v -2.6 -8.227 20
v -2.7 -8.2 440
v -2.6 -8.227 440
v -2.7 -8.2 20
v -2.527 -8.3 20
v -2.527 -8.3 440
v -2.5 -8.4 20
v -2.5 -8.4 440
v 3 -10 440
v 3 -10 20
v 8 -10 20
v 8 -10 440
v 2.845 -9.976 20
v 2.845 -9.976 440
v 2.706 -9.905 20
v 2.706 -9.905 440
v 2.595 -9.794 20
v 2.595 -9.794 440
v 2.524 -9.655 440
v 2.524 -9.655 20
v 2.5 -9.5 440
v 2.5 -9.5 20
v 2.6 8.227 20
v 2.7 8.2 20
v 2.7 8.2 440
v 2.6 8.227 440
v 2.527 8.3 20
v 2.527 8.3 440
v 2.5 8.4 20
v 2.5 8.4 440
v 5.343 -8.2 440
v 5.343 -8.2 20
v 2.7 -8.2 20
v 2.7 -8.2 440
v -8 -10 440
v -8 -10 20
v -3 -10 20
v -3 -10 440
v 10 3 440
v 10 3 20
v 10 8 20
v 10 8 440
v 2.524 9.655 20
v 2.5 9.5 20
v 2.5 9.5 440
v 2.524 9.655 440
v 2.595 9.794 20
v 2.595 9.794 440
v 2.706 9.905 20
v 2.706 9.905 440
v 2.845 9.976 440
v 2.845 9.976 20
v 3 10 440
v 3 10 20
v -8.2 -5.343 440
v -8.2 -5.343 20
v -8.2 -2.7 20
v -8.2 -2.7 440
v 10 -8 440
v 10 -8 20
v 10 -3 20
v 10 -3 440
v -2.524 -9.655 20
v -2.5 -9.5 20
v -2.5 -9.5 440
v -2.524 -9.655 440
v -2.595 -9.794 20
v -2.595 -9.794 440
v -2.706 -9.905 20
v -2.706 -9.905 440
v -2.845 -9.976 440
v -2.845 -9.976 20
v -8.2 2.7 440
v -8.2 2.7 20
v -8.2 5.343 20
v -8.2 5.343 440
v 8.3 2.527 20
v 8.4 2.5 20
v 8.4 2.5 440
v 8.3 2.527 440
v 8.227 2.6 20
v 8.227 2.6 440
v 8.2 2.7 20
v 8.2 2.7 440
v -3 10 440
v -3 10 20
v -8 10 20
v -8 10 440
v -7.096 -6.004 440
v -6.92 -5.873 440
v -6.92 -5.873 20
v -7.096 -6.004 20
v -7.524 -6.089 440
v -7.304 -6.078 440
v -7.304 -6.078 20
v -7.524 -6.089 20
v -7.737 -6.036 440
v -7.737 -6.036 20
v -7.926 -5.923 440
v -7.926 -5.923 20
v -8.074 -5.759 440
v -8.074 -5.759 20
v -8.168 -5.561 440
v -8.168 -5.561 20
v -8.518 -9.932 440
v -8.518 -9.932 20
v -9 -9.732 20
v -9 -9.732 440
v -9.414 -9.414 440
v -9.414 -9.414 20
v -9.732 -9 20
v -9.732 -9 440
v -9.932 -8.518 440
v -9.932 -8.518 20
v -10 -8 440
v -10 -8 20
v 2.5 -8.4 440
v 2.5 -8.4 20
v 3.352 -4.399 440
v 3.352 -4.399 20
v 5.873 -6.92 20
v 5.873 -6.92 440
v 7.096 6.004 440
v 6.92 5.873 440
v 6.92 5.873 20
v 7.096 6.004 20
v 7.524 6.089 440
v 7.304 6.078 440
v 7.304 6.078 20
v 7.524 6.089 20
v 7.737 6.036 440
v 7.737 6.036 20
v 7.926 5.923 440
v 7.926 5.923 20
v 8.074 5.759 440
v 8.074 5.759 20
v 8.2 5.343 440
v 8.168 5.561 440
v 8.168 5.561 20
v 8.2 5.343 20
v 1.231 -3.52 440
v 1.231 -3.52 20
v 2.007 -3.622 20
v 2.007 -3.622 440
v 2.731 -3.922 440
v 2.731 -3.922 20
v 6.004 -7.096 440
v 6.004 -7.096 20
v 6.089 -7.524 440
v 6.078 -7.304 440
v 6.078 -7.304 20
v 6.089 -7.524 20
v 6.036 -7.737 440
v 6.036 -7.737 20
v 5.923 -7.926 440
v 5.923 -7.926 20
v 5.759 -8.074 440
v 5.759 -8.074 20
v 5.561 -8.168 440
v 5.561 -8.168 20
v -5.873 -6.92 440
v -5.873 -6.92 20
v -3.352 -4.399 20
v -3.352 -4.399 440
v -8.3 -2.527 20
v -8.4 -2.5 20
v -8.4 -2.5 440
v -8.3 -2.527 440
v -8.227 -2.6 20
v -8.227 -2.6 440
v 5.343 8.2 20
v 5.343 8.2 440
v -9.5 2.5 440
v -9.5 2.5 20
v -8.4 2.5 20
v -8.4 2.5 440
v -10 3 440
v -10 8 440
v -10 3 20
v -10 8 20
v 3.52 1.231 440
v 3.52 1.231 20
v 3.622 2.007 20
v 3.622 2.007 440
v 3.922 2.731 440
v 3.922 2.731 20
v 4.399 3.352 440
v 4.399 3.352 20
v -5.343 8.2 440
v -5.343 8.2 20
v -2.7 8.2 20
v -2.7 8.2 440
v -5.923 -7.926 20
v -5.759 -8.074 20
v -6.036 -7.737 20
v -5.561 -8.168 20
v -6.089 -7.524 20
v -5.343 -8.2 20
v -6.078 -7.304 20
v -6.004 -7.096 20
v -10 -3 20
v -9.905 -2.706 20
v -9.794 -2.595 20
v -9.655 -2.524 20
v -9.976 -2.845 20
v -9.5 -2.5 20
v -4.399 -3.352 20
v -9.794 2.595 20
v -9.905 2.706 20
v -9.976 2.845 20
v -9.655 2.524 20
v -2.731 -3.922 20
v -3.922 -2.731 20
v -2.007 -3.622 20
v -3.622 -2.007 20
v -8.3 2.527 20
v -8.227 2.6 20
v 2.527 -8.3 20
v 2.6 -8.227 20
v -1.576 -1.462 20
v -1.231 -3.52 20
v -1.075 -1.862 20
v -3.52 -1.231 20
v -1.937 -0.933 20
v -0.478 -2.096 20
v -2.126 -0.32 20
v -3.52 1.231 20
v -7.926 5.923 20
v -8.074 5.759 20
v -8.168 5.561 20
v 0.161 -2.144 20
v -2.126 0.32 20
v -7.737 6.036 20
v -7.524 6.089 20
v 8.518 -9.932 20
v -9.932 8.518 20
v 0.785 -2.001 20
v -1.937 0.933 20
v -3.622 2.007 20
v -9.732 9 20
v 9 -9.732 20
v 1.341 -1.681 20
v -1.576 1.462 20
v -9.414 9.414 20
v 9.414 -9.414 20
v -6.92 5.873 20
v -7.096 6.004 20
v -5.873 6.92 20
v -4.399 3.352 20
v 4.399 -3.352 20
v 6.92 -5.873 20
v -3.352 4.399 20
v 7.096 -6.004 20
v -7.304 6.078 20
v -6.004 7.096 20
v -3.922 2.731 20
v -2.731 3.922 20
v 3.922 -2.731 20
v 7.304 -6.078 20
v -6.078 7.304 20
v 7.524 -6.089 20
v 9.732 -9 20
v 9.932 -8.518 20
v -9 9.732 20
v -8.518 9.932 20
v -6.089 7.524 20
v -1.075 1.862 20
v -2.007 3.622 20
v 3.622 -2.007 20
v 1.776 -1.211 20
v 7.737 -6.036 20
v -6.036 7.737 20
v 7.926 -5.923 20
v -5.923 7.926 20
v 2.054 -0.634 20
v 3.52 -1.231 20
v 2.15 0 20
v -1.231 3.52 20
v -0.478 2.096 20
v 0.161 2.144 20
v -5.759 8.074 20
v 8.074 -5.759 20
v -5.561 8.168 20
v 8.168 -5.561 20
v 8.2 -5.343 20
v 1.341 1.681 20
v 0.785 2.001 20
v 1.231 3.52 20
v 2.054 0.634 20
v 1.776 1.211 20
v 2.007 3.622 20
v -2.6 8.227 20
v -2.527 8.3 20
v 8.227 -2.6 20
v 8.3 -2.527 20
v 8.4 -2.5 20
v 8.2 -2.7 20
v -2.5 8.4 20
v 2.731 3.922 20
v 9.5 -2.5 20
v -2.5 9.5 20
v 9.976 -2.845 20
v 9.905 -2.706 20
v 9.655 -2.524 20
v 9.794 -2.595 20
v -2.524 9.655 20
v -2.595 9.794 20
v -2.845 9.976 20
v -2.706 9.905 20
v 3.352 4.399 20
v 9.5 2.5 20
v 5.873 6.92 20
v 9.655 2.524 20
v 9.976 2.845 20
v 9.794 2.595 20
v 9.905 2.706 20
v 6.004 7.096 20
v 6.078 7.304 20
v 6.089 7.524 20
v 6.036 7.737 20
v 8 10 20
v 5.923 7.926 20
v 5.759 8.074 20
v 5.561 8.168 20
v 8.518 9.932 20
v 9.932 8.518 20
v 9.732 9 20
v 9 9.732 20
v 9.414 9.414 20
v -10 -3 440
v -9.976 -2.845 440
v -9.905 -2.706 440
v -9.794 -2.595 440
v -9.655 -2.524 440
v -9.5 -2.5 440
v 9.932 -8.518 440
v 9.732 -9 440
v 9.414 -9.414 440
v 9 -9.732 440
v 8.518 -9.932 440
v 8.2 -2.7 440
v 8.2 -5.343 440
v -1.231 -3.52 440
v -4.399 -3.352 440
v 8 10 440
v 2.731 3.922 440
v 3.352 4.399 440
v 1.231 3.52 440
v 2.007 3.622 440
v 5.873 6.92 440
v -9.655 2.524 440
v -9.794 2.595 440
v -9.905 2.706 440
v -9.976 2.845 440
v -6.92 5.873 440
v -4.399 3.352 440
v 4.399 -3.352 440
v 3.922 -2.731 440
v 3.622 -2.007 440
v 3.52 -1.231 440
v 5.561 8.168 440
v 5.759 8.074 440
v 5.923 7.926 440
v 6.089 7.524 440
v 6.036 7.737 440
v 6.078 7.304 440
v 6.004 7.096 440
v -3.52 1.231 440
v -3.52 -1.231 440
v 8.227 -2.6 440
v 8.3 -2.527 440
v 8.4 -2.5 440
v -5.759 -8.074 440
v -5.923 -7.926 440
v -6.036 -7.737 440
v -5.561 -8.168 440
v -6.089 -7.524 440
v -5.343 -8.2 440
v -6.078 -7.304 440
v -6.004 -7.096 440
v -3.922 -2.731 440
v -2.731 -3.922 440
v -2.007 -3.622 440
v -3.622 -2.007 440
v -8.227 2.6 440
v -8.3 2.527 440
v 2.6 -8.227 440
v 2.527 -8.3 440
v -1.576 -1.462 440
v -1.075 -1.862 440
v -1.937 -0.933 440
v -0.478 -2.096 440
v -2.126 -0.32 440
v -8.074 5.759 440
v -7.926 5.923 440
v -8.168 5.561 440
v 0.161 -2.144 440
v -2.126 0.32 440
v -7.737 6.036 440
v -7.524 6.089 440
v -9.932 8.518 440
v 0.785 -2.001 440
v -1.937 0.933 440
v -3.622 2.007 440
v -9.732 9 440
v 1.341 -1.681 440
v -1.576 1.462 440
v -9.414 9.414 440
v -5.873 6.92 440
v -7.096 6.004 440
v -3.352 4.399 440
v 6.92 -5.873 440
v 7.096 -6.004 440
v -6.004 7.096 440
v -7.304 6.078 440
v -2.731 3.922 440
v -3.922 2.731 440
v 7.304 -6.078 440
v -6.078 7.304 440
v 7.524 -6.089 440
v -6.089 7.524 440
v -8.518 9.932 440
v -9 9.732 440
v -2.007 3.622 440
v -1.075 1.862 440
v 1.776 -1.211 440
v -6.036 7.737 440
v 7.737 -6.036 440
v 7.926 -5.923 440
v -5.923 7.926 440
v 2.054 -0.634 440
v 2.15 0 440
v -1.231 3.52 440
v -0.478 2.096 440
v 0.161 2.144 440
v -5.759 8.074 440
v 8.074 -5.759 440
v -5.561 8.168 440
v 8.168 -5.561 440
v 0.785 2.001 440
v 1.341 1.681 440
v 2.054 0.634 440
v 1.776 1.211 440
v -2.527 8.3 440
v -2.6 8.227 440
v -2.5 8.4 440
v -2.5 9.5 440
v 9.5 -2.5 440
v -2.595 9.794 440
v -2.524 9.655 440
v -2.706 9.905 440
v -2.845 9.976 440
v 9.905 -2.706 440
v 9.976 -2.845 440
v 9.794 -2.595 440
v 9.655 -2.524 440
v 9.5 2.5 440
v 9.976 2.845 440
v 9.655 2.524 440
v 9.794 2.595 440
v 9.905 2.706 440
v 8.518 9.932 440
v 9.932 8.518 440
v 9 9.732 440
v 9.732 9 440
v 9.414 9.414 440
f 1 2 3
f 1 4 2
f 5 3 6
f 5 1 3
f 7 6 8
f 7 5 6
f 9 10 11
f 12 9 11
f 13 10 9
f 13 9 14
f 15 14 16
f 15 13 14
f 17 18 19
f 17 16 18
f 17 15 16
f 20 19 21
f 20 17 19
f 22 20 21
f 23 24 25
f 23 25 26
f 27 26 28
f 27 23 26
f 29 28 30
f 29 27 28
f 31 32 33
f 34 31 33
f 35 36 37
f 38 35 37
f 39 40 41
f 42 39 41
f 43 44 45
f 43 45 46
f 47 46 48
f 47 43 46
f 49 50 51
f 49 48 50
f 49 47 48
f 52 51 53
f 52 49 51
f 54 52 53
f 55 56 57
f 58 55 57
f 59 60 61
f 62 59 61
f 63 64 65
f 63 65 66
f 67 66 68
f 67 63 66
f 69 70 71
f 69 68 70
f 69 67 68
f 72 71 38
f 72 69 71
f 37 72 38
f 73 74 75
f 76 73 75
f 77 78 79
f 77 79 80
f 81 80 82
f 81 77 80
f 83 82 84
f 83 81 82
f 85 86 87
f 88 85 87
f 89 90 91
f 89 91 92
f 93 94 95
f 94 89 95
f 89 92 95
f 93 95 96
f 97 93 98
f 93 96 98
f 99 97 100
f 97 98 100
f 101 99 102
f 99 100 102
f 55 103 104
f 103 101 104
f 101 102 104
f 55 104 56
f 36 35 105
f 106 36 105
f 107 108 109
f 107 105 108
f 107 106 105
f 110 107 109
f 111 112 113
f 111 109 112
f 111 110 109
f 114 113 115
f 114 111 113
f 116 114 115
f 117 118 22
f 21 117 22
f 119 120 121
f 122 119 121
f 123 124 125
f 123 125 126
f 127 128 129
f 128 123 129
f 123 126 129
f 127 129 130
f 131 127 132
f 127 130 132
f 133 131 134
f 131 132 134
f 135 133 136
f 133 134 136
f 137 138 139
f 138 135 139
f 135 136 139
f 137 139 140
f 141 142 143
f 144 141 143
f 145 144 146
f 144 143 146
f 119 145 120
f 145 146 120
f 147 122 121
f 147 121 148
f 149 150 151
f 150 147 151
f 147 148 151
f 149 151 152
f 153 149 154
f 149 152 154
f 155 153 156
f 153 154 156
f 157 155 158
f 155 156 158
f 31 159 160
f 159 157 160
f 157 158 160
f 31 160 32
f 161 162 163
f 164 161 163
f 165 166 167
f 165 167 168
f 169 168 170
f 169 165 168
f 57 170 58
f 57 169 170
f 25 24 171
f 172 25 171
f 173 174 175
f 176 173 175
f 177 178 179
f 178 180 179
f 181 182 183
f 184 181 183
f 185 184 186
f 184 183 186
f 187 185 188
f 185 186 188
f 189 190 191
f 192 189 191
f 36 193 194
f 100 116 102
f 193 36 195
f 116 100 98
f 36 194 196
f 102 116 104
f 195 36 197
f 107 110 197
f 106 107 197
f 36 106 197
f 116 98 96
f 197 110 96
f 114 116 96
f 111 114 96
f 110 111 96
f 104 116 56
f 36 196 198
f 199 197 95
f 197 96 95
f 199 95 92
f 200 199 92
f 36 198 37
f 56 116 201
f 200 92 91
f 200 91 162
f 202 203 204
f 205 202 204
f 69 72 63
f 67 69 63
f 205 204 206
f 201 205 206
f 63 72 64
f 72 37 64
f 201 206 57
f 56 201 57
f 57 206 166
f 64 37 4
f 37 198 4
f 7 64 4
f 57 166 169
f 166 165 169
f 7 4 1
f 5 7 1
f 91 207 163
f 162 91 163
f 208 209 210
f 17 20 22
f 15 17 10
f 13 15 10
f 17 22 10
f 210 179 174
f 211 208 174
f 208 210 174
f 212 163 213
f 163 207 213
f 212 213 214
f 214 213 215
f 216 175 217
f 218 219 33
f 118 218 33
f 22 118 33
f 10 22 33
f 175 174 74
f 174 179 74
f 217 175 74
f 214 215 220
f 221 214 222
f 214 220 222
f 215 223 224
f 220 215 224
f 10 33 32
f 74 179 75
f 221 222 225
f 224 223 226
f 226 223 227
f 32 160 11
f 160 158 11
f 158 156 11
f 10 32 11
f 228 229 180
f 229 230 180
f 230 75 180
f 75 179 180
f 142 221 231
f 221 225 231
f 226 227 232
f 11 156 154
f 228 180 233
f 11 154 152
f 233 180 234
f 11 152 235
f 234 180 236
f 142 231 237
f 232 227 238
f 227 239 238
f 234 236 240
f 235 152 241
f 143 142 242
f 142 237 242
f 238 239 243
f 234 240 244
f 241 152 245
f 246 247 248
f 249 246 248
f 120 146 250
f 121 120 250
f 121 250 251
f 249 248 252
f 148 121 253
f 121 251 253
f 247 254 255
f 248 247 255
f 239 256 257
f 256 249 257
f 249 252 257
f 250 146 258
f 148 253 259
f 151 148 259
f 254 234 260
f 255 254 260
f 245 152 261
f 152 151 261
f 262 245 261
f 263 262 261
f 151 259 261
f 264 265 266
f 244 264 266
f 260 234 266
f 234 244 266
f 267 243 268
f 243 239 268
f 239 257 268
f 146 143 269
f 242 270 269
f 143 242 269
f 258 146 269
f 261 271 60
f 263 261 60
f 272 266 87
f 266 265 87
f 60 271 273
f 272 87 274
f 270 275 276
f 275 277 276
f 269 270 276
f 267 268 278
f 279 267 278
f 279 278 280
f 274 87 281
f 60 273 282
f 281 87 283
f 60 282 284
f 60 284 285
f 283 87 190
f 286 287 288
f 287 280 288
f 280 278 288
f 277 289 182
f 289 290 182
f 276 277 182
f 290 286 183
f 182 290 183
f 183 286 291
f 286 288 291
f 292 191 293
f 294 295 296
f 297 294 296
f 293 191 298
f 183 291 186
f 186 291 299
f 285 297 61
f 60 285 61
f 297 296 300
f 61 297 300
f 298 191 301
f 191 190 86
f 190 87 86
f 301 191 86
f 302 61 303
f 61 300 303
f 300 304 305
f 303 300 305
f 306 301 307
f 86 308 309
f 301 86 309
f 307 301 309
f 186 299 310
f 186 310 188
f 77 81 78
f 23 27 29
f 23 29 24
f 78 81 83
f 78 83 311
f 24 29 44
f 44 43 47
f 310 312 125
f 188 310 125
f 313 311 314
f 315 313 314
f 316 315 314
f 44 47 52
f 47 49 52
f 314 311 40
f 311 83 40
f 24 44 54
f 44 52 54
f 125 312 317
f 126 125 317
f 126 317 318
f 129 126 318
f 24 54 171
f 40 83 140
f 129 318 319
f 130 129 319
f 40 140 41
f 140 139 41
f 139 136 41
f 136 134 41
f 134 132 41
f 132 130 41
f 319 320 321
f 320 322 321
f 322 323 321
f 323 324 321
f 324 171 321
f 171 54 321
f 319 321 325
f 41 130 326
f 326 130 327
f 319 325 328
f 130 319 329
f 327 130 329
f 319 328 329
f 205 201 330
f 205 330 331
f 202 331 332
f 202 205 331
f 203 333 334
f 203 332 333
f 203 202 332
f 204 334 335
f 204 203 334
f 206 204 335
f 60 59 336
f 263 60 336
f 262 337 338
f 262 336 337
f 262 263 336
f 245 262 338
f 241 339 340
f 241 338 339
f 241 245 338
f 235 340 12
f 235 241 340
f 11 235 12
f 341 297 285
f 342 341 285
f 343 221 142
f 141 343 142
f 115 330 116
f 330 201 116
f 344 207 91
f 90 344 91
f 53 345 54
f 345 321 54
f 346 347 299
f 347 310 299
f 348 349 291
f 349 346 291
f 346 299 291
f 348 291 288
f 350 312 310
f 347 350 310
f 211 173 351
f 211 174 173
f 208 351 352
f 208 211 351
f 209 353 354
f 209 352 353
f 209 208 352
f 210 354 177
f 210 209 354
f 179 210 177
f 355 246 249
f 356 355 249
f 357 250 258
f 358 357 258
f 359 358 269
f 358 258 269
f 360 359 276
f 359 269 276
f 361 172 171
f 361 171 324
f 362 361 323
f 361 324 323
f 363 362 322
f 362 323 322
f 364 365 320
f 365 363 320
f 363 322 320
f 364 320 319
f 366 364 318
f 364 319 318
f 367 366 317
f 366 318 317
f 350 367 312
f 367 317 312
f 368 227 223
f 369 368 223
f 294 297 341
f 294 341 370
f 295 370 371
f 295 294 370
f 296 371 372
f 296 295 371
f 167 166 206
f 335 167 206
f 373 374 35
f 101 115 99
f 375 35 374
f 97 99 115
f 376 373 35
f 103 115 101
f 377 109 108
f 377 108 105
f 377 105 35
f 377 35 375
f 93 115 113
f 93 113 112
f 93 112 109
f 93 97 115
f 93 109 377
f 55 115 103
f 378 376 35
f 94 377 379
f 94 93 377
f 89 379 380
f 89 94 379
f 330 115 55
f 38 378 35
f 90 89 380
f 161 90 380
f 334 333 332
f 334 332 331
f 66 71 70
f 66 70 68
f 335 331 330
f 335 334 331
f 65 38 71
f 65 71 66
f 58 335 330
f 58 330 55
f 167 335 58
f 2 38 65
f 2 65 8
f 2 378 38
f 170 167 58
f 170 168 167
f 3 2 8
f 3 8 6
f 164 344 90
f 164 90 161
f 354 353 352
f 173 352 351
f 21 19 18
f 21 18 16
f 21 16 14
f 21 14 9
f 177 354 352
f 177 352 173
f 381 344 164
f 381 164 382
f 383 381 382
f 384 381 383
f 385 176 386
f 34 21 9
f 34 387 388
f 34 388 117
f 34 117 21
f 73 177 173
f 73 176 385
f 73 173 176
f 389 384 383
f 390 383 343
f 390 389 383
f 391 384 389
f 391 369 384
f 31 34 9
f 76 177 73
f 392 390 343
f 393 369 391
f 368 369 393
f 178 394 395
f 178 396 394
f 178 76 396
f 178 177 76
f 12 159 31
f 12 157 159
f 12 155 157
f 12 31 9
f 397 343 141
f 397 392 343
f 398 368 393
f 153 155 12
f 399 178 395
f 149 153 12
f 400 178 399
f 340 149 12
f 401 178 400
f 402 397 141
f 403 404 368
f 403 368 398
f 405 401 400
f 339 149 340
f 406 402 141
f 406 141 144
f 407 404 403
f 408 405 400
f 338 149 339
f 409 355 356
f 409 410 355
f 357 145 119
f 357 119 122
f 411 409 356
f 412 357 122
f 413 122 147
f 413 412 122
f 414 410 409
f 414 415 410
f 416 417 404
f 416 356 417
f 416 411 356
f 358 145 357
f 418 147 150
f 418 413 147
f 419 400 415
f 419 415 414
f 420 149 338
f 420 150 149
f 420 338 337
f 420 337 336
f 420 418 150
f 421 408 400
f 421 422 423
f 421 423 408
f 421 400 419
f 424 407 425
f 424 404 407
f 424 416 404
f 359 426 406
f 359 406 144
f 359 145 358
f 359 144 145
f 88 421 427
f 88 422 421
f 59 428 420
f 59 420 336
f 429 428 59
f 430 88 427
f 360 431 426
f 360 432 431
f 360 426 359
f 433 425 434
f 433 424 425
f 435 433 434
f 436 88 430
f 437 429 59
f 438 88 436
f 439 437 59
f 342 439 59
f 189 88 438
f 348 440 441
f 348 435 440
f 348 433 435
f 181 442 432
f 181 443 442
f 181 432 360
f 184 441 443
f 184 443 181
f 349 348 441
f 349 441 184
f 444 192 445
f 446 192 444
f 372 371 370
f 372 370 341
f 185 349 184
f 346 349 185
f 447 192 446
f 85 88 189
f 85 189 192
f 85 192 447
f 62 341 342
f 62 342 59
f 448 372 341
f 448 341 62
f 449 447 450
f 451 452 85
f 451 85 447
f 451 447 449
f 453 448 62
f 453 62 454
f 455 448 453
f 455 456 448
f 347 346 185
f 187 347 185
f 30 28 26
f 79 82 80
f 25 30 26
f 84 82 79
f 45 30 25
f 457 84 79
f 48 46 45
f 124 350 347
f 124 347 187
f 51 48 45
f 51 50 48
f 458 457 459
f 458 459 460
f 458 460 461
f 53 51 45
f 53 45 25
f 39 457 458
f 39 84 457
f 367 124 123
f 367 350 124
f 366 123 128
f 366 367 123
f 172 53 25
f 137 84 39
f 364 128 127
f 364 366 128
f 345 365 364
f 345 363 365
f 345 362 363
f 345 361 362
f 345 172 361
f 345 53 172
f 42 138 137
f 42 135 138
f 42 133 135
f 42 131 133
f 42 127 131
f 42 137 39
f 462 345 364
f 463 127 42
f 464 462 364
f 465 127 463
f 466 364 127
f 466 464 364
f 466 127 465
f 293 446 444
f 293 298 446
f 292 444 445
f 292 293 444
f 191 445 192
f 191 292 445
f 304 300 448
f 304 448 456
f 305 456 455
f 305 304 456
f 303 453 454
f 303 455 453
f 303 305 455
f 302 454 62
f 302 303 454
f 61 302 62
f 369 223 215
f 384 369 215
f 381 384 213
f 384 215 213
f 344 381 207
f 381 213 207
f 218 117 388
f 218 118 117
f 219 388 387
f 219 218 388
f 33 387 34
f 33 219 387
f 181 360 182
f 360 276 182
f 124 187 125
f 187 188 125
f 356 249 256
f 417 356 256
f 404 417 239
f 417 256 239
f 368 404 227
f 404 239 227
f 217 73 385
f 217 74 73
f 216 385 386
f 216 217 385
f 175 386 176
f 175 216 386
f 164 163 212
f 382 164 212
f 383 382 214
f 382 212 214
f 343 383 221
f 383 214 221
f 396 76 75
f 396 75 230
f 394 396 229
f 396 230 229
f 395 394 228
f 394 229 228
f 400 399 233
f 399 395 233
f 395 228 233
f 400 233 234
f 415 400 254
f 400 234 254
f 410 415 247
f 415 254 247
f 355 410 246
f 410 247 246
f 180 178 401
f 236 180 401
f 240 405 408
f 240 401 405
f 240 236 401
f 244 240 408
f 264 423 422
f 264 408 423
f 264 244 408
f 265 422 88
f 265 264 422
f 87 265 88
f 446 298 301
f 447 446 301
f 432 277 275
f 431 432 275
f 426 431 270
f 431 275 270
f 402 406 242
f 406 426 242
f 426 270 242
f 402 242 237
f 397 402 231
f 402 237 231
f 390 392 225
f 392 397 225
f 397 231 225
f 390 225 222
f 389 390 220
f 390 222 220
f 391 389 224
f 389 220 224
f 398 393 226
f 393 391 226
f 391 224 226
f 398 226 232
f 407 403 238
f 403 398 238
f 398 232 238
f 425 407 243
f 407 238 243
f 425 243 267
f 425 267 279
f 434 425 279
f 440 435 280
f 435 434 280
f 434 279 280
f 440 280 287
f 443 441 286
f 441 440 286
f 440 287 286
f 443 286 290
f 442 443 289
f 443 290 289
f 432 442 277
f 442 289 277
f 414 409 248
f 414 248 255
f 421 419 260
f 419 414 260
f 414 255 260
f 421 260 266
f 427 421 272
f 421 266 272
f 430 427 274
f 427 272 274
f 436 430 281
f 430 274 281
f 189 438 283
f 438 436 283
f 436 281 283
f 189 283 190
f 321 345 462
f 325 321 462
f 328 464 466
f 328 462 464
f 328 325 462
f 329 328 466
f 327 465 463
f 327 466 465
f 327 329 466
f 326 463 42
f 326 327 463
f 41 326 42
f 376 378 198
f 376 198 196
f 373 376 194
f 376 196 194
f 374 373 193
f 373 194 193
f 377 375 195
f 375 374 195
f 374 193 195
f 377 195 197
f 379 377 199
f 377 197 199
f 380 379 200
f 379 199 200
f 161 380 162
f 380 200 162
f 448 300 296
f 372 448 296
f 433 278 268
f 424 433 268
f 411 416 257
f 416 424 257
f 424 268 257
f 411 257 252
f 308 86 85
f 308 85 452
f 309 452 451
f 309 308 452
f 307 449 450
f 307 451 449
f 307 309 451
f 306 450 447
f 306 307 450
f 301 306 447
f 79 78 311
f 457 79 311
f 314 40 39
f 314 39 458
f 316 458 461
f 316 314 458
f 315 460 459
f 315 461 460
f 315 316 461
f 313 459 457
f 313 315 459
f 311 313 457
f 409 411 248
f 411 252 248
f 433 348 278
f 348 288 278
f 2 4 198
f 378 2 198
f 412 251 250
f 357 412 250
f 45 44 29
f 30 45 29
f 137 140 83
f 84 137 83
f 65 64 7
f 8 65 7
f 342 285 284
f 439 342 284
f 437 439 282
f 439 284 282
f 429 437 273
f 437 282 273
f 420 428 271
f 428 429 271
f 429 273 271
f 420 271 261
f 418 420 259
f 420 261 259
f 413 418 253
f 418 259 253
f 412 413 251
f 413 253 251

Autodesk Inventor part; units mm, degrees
ref_plane "Płaszczyzna początkowa" through (0, 0, 20) normal (0, 0, 1) x (1, 0, 0)
ref_plane "Płaszczyzna końcowa" through (0, 0, 440) normal (0, 0, 1) x (1, 0, 0)
sketch "Szkic" plane through (0, 0, 0) normal (0, 0, 1) x (1, 0, 0)
  arc A0 (8, -10) -> (10, -8) centre (8, -8) ccw
  line L0 (10, -8) -> (10, -3)
  arc A1 (10, -3) -> (9.5, -2.5) centre (9.5, -3) ccw
  line L1 (9.5, -2.5) -> (8.4, -2.5)
  arc A2 (8.4, -2.5) -> (8.2, -2.7) centre (8.4, -2.7) ccw
  line L2 (8.2, -2.7) -> (8.2, -5.3428)
  arc A3 (6.9197, -5.8732) -> (8.2, -5.3428) centre (7.45, -5.3428) ccw
  line L3 (6.9197, -5.8732) -> (4.3987, -3.3522)
  arc A4 (3.52, -1.2308) -> (4.3987, -3.3522) centre (6.52, -1.2308) ccw
  line L4 (3.52, -1.2308) -> (3.52, 1.2308)
  arc A5 (4.3987, 3.3522) -> (3.52, 1.2308) centre (6.52, 1.2308) ccw
  line L5 (4.3987, 3.3522) -> (6.9197, 5.8732)
  arc A6 (8.2, 5.3428) -> (6.9197, 5.8732) centre (7.45, 5.3428) ccw
  line L6 (8.2, 5.3428) -> (8.2, 2.7)
  arc A7 (8.2, 2.7) -> (8.4, 2.5) centre (8.4, 2.7) ccw
  line L7 (8.4, 2.5) -> (9.5, 2.5)
  arc A8 (9.5, 2.5) -> (10, 3) centre (9.5, 3) ccw
  line L8 (10, 3) -> (10, 8)
  arc A9 (10, 8) -> (8, 10) centre (8, 8) ccw
  line L9 (8, 10) -> (3, 10)
  arc A10 (3, 10) -> (2.5, 9.5) centre (3, 9.5) ccw
  line L10 (2.5, 9.5) -> (2.5, 8.4)
  arc A11 (2.5, 8.4) -> (2.7, 8.2) centre (2.7, 8.4) ccw
  line L11 (2.7, 8.2) -> (5.3428, 8.2)
  arc A12 (5.8732, 6.9197) -> (5.3428, 8.2) centre (5.3428, 7.45) ccw
  line L12 (5.8732, 6.9197) -> (3.3522, 4.3987)
  arc A13 (1.2308, 3.52) -> (3.3522, 4.3987) centre (1.2308, 6.52) ccw
  line L13 (1.2308, 3.52) -> (-1.2308, 3.52)
  arc A14 (-3.3522, 4.3987) -> (-1.2308, 3.52) centre (-1.2308, 6.52) ccw
  line L14 (-3.3522, 4.3987) -> (-5.8732, 6.9197)
  arc A15 (-5.3428, 8.2) -> (-5.8732, 6.9197) centre (-5.3428, 7.45) ccw
  line L15 (-5.3428, 8.2) -> (-2.7, 8.2)
  arc A16 (-2.7, 8.2) -> (-2.5, 8.4) centre (-2.7, 8.4) ccw
  line L16 (-2.5, 8.4) -> (-2.5, 9.5)
  arc A17 (-2.5, 9.5) -> (-3, 10) centre (-3, 9.5) ccw
  line L17 (-3, 10) -> (-8, 10)
  arc A18 (-8, 10) -> (-10, 8) centre (-8, 8) ccw
  line L18 (-10, 8) -> (-10, 3)
  arc A19 (-10, 3) -> (-9.5, 2.5) centre (-9.5, 3) ccw
  line L19 (-9.5, 2.5) -> (-8.4, 2.5)
  arc A20 (-8.4, 2.5) -> (-8.2, 2.7) centre (-8.4, 2.7) ccw
  line L20 (-8.2, 2.7) -> (-8.2, 5.3428)
  arc A21 (-6.9197, 5.8732) -> (-8.2, 5.3428) centre (-7.45, 5.3428) ccw
  line L21 (-6.9197, 5.8732) -> (-4.3987, 3.3522)
  arc A22 (-3.52, 1.2308) -> (-4.3987, 3.3522) centre (-6.52, 1.2308) ccw
  line L22 (-3.52, 1.2308) -> (-3.52, -1.2308)
  arc A23 (-4.3987, -3.3522) -> (-3.52, -1.2308) centre (-6.52, -1.2308) ccw
  line L23 (-4.3987, -3.3522) -> (-6.9197, -5.8732)
  arc A24 (-8.2, -5.3428) -> (-6.9197, -5.8732) centre (-7.45, -5.3428) ccw
  line L24 (-8.2, -5.3428) -> (-8.2, -2.7)
  arc A25 (-8.2, -2.7) -> (-8.4, -2.5) centre (-8.4, -2.7) ccw
  line L25 (-8.4, -2.5) -> (-9.5, -2.5)
  arc A26 (-9.5, -2.5) -> (-10, -3) centre (-9.5, -3) ccw
  line L26 (-10, -3) -> (-10, -8)
  arc A27 (-10, -8) -> (-8, -10) centre (-8, -8) ccw
  line L27 (-8, -10) -> (-3, -10)
  arc A28 (-3, -10) -> (-2.5, -9.5) centre (-3, -9.5) ccw
  line L28 (-2.5, -9.5) -> (-2.5, -8.4)
  arc A29 (-2.5, -8.4) -> (-2.7, -8.2) centre (-2.7, -8.4) ccw
  line L29 (-2.7, -8.2) -> (-5.3428, -8.2)
  arc A30 (-5.8732, -6.9197) -> (-5.3428, -8.2) centre (-5.3428, -7.45) ccw
  line L30 (-5.8732, -6.9197) -> (-3.3522, -4.3987)
  arc A31 (-1.2308, -3.52) -> (-3.3522, -4.3987) centre (-1.2308, -6.52) ccw
  line L31 (-1.2308, -3.52) -> (1.2308, -3.52)
  arc A32 (3.3522, -4.3987) -> (1.2308, -3.52) centre (1.2308, -6.52) ccw
  line L32 (3.3522, -4.3987) -> (5.8732, -6.9197)
  arc A33 (5.3428, -8.2) -> (5.8732, -6.9197) centre (5.3428, -7.45) ccw
  line L33 (5.3428, -8.2) -> (2.7, -8.2)
  arc A34 (2.7, -8.2) -> (2.5, -8.4) centre (2.7, -8.4) ccw
  line L34 (2.5, -8.4) -> (2.5, -9.5)
  arc A35 (2.5, -9.5) -> (3, -10) centre (3, -9.5) ccw
  line L35 (3, -10) -> (8, -10)
  circle A36 centre (0, 0) radius 2.15
  point P0 (10, -10)
extrude "Bryła" add sketch "Szkic" along normal up to surface (420 mm away) from surface at 20
sketch "Szkic4" plane through (0, 0, 0) normal (0, 0, 1) x (1, 0, 0)
  line L0 (0, 0) -> (10, 0)
ref_plane "Płaszczyzna konstrukcyjna4" through (0, 0, 0) normal (0, -1, 0) x (1, 0, 0)
sketch "Szkic5" plane through (0, 0, 0) normal (0, -1, 0) x (1, 0, 0)
  line L0 (-2, 20) -> (12, 20)
  line L1 (-2, 440) -> (12, 440)
  dimension "d7" = 420
ref_plane "Płaszczyzna konstrukcyjna5" through (-216.75, 3, 440) normal (0, 0, 1) x (1, 0, 0)
split "Podział1" plane through (-216.75, 3, 440) removes the side toward (0, 0, 1)
ref_plane "Płaszczyzna konstrukcyjna6" through (-225, 8, 20) normal (0, 0, -1) x (-1, 0, 0)
split "Podział2" plane through (-225, 8, 20) removes the side toward (0, 0, -1)
equation "\"G_L\" = d7"
properties part number "COTS_ARMA_AR3701_20x20_Alu_Extr_00000010" material "Aluminium 6061-AHC"
